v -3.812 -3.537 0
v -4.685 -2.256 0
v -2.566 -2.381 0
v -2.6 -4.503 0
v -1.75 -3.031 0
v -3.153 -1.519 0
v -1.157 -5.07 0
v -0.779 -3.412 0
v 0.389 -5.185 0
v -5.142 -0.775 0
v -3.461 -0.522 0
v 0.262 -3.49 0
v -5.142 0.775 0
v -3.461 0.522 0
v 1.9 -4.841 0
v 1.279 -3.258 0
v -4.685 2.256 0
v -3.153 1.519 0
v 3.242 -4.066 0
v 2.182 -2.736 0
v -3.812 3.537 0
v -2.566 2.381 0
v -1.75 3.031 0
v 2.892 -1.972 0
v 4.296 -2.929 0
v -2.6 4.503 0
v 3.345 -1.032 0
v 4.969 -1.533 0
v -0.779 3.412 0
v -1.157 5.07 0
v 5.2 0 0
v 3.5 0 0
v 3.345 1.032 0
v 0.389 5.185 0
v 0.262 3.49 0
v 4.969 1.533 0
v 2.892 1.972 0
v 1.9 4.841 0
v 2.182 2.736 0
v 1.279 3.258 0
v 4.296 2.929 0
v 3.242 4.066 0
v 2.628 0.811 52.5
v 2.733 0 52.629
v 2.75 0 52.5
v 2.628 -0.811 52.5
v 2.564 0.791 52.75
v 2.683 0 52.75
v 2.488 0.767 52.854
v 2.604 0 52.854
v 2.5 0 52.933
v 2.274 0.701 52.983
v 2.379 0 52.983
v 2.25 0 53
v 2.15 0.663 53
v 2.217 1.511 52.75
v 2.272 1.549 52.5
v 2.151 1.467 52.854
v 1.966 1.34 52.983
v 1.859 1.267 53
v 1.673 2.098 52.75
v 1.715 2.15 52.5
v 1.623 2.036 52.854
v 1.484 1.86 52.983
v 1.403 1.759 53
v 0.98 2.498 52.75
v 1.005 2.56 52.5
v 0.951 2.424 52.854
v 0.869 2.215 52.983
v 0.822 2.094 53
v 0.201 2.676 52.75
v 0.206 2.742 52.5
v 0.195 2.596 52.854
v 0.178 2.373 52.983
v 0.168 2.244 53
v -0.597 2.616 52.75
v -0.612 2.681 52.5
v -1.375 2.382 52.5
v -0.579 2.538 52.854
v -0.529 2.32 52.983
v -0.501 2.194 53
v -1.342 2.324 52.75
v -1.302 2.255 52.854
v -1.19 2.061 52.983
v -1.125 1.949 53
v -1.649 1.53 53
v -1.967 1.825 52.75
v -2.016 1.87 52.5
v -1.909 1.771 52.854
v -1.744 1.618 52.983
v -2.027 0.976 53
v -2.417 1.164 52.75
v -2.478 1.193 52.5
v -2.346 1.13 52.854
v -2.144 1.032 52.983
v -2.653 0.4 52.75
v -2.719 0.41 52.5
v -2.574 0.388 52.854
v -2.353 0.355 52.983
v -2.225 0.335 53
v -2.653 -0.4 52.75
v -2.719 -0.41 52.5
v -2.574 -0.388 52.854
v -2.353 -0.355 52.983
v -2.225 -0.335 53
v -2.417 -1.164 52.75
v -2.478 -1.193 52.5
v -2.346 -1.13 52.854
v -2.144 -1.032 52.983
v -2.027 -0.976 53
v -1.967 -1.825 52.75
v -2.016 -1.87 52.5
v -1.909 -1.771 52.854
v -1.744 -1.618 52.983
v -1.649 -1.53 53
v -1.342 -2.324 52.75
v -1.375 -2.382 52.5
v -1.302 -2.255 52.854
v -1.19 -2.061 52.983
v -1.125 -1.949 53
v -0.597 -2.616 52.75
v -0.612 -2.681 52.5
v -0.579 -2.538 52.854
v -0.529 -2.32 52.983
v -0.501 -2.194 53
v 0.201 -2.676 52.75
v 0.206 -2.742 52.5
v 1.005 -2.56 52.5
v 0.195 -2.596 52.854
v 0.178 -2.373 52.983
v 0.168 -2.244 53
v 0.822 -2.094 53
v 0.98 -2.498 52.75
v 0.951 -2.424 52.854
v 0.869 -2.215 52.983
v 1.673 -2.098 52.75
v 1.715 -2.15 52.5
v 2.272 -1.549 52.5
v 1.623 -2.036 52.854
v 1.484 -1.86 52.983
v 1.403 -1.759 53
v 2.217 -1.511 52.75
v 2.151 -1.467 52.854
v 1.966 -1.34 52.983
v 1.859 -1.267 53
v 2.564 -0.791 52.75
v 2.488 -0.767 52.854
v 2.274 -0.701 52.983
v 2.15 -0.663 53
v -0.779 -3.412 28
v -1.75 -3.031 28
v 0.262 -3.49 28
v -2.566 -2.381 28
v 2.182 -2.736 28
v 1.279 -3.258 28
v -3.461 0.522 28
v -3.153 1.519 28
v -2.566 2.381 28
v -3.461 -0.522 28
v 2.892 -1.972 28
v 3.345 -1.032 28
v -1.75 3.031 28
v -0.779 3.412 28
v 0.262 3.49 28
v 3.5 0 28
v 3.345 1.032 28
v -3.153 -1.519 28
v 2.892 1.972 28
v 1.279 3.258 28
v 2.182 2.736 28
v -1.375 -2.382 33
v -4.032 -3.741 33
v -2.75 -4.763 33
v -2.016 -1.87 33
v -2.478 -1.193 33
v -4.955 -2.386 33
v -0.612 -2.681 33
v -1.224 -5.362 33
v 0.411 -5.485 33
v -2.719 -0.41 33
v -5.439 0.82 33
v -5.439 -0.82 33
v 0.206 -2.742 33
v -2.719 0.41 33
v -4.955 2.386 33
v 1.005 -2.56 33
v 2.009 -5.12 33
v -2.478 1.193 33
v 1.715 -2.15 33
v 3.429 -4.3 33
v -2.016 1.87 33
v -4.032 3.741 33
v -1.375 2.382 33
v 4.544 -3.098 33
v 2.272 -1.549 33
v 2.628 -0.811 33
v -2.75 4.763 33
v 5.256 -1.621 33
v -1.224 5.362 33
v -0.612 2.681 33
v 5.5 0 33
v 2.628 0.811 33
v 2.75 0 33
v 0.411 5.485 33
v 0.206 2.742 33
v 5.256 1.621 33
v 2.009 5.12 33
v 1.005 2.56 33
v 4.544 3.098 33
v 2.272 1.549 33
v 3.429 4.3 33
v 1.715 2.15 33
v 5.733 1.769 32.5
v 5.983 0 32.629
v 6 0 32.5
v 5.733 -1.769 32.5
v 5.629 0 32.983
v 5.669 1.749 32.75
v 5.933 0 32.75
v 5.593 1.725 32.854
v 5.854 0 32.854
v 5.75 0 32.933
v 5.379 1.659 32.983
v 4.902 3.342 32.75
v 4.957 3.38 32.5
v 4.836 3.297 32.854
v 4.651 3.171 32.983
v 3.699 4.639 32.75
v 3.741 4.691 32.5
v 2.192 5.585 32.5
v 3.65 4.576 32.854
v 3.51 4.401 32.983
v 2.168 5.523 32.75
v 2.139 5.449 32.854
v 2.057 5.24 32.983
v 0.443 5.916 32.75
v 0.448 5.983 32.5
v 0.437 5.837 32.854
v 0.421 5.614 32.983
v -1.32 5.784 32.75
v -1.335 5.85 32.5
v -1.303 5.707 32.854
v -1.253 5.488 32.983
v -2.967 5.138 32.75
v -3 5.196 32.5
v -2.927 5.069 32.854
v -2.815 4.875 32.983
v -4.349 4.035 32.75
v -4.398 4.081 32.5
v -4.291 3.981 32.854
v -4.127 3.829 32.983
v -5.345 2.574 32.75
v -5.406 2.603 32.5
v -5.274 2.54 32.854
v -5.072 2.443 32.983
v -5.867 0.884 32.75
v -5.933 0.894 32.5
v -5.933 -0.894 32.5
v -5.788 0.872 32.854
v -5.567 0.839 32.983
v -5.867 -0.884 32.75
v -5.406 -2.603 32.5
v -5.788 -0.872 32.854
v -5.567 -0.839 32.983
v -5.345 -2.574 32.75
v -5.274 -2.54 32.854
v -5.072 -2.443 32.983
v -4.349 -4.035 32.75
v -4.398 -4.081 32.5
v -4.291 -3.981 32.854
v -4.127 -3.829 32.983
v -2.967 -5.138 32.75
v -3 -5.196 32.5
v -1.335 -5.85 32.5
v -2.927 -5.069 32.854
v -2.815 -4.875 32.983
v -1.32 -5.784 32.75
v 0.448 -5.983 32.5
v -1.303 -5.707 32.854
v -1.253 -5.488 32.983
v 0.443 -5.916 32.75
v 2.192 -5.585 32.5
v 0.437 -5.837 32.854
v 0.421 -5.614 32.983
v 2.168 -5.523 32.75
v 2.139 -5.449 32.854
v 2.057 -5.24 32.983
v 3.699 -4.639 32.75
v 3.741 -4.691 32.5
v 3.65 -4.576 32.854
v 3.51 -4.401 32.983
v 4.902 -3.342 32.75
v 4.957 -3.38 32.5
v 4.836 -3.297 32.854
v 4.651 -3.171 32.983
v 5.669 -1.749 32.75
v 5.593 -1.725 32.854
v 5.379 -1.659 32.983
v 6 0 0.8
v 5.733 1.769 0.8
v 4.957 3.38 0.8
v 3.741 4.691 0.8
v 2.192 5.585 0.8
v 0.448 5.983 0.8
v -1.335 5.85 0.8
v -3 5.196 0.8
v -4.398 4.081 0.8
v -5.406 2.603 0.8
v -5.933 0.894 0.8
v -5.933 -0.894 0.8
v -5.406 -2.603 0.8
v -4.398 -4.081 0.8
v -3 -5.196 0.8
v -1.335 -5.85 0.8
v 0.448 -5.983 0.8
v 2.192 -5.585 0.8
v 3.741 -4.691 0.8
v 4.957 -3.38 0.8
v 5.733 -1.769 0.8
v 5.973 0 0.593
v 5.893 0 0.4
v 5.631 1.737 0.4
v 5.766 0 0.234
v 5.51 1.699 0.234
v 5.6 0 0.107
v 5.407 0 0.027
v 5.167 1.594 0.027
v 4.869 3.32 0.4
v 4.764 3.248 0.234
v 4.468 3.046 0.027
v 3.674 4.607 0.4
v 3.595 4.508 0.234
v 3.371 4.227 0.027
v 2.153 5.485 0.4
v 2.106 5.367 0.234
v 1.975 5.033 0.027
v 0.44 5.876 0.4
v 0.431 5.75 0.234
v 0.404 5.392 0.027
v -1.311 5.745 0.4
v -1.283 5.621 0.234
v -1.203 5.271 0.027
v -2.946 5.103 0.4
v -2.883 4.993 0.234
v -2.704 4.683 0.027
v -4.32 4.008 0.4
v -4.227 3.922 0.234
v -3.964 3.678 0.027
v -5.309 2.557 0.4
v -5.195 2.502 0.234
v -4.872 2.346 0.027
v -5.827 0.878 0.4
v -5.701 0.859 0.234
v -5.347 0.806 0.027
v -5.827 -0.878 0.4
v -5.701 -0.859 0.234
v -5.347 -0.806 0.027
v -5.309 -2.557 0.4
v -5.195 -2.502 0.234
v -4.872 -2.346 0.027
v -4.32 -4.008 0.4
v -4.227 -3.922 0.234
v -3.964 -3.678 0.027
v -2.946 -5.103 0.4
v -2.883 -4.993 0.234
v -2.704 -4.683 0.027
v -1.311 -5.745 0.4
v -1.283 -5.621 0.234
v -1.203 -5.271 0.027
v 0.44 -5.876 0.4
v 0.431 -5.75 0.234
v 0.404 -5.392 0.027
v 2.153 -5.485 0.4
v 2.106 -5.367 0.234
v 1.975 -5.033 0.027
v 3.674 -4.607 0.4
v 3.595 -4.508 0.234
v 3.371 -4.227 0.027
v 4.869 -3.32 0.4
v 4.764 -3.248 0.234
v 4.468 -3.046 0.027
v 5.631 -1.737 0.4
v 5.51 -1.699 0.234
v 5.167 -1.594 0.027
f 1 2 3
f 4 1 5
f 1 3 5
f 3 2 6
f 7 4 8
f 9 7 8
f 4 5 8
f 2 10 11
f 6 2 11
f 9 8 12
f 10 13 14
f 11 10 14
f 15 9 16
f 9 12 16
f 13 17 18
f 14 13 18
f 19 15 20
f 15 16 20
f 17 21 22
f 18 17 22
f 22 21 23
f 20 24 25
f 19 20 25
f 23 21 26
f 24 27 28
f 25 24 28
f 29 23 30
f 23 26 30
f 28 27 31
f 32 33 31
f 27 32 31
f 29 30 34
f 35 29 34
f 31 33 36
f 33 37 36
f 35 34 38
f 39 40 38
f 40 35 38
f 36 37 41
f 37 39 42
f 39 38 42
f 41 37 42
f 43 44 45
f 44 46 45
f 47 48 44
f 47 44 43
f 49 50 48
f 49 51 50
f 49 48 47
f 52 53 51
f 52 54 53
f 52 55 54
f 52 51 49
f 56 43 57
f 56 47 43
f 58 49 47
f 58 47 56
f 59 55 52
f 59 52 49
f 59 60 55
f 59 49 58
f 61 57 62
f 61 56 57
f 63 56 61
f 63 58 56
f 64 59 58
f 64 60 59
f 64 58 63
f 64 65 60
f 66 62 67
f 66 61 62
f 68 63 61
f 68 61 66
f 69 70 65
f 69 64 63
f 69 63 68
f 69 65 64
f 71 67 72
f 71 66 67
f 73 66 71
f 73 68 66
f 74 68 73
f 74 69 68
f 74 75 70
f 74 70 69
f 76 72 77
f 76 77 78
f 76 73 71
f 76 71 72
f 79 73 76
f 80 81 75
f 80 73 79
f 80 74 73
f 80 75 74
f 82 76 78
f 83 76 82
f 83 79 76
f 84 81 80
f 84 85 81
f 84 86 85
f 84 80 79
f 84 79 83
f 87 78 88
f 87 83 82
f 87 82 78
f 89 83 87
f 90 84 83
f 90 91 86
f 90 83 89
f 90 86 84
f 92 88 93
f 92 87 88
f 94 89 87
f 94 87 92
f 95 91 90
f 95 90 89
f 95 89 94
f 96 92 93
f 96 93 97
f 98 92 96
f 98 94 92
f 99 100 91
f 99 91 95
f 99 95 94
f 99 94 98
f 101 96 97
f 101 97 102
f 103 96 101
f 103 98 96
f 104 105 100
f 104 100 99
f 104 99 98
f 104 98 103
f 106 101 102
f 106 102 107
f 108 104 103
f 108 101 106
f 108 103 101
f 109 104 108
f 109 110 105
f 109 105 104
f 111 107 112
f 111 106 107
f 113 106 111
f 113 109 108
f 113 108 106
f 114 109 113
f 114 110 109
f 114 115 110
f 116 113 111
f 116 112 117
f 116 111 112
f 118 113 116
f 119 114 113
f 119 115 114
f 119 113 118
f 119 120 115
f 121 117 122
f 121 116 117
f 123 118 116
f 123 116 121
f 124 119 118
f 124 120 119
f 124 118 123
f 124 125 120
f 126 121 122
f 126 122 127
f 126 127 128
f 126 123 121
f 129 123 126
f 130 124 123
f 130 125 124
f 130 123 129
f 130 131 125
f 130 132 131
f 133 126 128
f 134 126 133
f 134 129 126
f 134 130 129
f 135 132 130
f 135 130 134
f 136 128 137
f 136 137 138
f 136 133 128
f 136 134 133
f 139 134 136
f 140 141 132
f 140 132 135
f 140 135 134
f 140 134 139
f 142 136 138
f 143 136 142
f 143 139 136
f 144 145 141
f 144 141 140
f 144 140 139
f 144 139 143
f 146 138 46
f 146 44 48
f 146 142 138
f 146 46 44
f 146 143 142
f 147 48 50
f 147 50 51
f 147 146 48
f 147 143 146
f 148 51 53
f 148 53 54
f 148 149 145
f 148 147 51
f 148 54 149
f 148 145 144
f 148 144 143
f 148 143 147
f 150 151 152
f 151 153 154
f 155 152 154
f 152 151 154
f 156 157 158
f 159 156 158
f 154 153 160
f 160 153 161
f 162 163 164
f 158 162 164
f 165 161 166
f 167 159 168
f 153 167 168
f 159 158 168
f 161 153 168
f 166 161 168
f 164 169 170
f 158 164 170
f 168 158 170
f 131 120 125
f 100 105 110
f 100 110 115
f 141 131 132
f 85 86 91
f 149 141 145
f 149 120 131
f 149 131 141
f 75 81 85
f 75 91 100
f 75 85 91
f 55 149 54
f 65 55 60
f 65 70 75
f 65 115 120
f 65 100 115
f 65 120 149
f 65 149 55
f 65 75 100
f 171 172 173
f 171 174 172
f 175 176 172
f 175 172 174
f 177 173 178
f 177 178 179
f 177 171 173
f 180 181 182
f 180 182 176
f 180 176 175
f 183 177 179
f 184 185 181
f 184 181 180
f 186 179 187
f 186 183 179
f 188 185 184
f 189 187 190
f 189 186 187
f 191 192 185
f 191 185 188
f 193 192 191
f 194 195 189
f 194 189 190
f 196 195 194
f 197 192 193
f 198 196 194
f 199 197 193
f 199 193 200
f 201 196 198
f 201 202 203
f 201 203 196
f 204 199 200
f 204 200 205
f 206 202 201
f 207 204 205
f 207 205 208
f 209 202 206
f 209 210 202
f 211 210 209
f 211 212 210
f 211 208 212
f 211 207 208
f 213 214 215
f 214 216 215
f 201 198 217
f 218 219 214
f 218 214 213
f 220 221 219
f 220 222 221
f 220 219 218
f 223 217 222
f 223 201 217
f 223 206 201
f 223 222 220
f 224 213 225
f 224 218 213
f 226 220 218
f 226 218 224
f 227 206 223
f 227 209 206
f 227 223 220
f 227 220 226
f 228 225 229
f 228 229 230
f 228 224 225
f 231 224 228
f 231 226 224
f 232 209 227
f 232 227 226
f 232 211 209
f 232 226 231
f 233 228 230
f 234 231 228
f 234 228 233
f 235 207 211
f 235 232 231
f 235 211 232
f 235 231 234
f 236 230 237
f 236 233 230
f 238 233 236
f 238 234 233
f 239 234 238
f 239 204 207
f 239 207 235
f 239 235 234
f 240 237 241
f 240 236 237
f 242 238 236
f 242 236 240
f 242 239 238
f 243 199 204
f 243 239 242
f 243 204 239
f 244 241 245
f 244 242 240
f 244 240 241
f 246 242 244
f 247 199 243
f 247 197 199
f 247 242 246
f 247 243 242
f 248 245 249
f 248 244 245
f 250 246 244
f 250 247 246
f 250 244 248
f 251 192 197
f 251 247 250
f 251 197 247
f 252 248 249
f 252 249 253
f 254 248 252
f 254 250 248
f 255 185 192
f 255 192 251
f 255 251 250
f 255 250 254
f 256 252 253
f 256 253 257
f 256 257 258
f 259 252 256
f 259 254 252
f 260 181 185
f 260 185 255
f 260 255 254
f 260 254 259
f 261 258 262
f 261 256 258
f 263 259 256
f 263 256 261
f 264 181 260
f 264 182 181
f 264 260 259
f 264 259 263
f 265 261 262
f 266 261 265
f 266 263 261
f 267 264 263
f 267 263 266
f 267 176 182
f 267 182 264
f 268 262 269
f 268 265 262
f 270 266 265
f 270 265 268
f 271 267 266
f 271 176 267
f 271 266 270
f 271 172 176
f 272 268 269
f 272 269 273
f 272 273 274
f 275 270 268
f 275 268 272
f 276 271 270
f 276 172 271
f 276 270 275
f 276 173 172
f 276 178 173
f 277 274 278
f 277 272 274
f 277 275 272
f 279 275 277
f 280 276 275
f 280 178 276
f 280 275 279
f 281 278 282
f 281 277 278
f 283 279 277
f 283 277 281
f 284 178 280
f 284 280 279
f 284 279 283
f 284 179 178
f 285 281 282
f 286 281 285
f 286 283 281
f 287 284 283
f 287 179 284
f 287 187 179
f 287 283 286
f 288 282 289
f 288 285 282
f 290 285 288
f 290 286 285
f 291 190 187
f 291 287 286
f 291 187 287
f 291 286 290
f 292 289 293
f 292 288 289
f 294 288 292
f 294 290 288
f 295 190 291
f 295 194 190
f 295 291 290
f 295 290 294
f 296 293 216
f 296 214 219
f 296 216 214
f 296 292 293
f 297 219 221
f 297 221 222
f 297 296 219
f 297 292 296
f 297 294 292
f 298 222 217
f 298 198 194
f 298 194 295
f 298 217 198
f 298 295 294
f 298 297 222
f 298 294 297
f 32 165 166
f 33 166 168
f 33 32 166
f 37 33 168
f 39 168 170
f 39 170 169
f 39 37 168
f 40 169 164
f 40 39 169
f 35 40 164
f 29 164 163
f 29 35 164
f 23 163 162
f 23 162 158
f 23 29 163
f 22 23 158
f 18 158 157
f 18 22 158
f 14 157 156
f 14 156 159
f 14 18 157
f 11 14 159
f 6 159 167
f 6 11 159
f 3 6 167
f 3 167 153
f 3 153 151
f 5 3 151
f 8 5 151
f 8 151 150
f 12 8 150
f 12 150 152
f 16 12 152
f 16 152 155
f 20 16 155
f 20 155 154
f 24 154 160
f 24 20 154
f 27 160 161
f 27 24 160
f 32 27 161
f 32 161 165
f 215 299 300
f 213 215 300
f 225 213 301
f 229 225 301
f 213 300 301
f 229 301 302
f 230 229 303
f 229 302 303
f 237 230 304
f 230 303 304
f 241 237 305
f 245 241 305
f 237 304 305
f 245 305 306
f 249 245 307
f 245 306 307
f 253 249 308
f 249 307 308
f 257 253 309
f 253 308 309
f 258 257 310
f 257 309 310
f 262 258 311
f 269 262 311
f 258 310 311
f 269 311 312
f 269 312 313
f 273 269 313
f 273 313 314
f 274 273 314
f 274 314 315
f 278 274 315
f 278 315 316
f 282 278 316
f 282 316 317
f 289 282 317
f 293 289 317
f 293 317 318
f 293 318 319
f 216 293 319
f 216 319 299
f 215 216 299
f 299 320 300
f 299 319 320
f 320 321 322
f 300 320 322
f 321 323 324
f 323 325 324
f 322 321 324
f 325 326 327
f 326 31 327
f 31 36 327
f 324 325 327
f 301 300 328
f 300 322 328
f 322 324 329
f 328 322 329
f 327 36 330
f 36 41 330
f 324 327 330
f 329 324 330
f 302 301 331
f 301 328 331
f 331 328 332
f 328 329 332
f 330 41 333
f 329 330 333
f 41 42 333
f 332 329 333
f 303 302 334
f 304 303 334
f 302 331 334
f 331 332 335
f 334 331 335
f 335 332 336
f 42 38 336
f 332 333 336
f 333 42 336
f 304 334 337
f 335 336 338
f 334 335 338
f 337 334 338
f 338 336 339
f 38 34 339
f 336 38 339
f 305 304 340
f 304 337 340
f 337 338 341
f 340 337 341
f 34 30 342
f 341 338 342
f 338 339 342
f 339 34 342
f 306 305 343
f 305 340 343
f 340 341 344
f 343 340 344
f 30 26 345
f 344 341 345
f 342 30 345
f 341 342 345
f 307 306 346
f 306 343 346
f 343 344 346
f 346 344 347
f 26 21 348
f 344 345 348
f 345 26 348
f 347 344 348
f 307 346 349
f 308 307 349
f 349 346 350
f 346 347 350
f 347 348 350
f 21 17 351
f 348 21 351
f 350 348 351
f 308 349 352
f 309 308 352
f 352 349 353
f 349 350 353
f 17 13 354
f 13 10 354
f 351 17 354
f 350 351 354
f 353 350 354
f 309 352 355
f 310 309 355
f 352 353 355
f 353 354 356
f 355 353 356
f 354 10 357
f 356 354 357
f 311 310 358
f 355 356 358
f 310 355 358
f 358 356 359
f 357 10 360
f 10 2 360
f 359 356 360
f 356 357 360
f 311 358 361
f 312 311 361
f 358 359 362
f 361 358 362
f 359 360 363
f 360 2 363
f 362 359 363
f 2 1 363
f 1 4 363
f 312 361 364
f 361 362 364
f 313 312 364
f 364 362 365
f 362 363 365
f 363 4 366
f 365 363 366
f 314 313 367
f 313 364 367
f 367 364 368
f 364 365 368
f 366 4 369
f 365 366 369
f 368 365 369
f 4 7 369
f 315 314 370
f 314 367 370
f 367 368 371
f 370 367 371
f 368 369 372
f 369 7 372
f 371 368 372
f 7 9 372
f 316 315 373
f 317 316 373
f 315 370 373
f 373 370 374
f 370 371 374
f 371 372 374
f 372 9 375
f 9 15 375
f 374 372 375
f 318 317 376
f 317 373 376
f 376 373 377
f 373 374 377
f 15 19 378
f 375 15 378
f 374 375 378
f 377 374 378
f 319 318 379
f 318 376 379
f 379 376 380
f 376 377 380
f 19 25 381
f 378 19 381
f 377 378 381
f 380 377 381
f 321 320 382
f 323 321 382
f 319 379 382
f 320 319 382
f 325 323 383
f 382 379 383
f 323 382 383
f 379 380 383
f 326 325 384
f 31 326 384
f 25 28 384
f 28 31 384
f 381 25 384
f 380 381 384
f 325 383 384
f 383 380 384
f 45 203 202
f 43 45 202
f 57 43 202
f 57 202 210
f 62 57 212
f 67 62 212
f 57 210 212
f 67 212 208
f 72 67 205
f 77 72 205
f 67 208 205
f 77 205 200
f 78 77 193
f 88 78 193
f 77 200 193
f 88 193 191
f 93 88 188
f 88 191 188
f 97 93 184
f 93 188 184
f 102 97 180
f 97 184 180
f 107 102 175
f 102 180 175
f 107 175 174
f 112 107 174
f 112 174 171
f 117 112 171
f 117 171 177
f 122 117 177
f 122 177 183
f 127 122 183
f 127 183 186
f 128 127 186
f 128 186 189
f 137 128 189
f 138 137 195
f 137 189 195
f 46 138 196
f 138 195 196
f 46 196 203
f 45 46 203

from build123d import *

# Parameters (mm, degrees)
CROQUIS1_R              = 6
CROQUIS1_R_2            = 3.5
SALIENTE_EXTRUIR1_DEPTH = 28
CROQUIS2_R              = 6
SALIENTE_EXTRUIR2_DEPTH = 5
CROQUIS3_R              = 2.75
SALIENTE_EXTRUIR3_DEPTH = 20
REDONDEO1_R             = 0.5
REDONDEO2_R             = 0.8
REDONDEO3_R             = 0.5


with BuildPart() as part:
    # Croquis1 → Saliente-Extruir1 (new body)
    with BuildSketch(Plane.XY):
        Circle(CROQUIS1_R)
        Circle(CROQUIS1_R_2, mode=Mode.SUBTRACT)
    extrude(amount=SALIENTE_EXTRUIR1_DEPTH)

    # Croquis2 → Saliente-Extruir2 (add)
    with BuildSketch(Plane.XY.offset(28)):
        Circle(CROQUIS2_R)
    extrude(amount=SALIENTE_EXTRUIR2_DEPTH)

    # Croquis3 → Saliente-Extruir3 (add)
    with BuildSketch(Plane.XY.offset(33)):
        Circle(CROQUIS3_R)
    extrude(amount=SALIENTE_EXTRUIR3_DEPTH)

    # Redondeo1
    redondeo1_edges = [part.edges().sort_by_distance(p)[0] for p in [
        (-6, 0, 33),
    ]]
    fillet(redondeo1_edges, radius=REDONDEO1_R)

    # Redondeo2
    redondeo2_edges = [part.edges().sort_by_distance(p)[0] for p in [
        (-6, 0, 0),
    ]]
    fillet(redondeo2_edges, radius=REDONDEO2_R)

    # Redondeo3
    redondeo3_edges = [part.edges().sort_by_distance(p)[0] for p in [
        (-2.75, 0, 53),
    ]]
    fillet(redondeo3_edges, radius=REDONDEO3_R)


solid = part.part
